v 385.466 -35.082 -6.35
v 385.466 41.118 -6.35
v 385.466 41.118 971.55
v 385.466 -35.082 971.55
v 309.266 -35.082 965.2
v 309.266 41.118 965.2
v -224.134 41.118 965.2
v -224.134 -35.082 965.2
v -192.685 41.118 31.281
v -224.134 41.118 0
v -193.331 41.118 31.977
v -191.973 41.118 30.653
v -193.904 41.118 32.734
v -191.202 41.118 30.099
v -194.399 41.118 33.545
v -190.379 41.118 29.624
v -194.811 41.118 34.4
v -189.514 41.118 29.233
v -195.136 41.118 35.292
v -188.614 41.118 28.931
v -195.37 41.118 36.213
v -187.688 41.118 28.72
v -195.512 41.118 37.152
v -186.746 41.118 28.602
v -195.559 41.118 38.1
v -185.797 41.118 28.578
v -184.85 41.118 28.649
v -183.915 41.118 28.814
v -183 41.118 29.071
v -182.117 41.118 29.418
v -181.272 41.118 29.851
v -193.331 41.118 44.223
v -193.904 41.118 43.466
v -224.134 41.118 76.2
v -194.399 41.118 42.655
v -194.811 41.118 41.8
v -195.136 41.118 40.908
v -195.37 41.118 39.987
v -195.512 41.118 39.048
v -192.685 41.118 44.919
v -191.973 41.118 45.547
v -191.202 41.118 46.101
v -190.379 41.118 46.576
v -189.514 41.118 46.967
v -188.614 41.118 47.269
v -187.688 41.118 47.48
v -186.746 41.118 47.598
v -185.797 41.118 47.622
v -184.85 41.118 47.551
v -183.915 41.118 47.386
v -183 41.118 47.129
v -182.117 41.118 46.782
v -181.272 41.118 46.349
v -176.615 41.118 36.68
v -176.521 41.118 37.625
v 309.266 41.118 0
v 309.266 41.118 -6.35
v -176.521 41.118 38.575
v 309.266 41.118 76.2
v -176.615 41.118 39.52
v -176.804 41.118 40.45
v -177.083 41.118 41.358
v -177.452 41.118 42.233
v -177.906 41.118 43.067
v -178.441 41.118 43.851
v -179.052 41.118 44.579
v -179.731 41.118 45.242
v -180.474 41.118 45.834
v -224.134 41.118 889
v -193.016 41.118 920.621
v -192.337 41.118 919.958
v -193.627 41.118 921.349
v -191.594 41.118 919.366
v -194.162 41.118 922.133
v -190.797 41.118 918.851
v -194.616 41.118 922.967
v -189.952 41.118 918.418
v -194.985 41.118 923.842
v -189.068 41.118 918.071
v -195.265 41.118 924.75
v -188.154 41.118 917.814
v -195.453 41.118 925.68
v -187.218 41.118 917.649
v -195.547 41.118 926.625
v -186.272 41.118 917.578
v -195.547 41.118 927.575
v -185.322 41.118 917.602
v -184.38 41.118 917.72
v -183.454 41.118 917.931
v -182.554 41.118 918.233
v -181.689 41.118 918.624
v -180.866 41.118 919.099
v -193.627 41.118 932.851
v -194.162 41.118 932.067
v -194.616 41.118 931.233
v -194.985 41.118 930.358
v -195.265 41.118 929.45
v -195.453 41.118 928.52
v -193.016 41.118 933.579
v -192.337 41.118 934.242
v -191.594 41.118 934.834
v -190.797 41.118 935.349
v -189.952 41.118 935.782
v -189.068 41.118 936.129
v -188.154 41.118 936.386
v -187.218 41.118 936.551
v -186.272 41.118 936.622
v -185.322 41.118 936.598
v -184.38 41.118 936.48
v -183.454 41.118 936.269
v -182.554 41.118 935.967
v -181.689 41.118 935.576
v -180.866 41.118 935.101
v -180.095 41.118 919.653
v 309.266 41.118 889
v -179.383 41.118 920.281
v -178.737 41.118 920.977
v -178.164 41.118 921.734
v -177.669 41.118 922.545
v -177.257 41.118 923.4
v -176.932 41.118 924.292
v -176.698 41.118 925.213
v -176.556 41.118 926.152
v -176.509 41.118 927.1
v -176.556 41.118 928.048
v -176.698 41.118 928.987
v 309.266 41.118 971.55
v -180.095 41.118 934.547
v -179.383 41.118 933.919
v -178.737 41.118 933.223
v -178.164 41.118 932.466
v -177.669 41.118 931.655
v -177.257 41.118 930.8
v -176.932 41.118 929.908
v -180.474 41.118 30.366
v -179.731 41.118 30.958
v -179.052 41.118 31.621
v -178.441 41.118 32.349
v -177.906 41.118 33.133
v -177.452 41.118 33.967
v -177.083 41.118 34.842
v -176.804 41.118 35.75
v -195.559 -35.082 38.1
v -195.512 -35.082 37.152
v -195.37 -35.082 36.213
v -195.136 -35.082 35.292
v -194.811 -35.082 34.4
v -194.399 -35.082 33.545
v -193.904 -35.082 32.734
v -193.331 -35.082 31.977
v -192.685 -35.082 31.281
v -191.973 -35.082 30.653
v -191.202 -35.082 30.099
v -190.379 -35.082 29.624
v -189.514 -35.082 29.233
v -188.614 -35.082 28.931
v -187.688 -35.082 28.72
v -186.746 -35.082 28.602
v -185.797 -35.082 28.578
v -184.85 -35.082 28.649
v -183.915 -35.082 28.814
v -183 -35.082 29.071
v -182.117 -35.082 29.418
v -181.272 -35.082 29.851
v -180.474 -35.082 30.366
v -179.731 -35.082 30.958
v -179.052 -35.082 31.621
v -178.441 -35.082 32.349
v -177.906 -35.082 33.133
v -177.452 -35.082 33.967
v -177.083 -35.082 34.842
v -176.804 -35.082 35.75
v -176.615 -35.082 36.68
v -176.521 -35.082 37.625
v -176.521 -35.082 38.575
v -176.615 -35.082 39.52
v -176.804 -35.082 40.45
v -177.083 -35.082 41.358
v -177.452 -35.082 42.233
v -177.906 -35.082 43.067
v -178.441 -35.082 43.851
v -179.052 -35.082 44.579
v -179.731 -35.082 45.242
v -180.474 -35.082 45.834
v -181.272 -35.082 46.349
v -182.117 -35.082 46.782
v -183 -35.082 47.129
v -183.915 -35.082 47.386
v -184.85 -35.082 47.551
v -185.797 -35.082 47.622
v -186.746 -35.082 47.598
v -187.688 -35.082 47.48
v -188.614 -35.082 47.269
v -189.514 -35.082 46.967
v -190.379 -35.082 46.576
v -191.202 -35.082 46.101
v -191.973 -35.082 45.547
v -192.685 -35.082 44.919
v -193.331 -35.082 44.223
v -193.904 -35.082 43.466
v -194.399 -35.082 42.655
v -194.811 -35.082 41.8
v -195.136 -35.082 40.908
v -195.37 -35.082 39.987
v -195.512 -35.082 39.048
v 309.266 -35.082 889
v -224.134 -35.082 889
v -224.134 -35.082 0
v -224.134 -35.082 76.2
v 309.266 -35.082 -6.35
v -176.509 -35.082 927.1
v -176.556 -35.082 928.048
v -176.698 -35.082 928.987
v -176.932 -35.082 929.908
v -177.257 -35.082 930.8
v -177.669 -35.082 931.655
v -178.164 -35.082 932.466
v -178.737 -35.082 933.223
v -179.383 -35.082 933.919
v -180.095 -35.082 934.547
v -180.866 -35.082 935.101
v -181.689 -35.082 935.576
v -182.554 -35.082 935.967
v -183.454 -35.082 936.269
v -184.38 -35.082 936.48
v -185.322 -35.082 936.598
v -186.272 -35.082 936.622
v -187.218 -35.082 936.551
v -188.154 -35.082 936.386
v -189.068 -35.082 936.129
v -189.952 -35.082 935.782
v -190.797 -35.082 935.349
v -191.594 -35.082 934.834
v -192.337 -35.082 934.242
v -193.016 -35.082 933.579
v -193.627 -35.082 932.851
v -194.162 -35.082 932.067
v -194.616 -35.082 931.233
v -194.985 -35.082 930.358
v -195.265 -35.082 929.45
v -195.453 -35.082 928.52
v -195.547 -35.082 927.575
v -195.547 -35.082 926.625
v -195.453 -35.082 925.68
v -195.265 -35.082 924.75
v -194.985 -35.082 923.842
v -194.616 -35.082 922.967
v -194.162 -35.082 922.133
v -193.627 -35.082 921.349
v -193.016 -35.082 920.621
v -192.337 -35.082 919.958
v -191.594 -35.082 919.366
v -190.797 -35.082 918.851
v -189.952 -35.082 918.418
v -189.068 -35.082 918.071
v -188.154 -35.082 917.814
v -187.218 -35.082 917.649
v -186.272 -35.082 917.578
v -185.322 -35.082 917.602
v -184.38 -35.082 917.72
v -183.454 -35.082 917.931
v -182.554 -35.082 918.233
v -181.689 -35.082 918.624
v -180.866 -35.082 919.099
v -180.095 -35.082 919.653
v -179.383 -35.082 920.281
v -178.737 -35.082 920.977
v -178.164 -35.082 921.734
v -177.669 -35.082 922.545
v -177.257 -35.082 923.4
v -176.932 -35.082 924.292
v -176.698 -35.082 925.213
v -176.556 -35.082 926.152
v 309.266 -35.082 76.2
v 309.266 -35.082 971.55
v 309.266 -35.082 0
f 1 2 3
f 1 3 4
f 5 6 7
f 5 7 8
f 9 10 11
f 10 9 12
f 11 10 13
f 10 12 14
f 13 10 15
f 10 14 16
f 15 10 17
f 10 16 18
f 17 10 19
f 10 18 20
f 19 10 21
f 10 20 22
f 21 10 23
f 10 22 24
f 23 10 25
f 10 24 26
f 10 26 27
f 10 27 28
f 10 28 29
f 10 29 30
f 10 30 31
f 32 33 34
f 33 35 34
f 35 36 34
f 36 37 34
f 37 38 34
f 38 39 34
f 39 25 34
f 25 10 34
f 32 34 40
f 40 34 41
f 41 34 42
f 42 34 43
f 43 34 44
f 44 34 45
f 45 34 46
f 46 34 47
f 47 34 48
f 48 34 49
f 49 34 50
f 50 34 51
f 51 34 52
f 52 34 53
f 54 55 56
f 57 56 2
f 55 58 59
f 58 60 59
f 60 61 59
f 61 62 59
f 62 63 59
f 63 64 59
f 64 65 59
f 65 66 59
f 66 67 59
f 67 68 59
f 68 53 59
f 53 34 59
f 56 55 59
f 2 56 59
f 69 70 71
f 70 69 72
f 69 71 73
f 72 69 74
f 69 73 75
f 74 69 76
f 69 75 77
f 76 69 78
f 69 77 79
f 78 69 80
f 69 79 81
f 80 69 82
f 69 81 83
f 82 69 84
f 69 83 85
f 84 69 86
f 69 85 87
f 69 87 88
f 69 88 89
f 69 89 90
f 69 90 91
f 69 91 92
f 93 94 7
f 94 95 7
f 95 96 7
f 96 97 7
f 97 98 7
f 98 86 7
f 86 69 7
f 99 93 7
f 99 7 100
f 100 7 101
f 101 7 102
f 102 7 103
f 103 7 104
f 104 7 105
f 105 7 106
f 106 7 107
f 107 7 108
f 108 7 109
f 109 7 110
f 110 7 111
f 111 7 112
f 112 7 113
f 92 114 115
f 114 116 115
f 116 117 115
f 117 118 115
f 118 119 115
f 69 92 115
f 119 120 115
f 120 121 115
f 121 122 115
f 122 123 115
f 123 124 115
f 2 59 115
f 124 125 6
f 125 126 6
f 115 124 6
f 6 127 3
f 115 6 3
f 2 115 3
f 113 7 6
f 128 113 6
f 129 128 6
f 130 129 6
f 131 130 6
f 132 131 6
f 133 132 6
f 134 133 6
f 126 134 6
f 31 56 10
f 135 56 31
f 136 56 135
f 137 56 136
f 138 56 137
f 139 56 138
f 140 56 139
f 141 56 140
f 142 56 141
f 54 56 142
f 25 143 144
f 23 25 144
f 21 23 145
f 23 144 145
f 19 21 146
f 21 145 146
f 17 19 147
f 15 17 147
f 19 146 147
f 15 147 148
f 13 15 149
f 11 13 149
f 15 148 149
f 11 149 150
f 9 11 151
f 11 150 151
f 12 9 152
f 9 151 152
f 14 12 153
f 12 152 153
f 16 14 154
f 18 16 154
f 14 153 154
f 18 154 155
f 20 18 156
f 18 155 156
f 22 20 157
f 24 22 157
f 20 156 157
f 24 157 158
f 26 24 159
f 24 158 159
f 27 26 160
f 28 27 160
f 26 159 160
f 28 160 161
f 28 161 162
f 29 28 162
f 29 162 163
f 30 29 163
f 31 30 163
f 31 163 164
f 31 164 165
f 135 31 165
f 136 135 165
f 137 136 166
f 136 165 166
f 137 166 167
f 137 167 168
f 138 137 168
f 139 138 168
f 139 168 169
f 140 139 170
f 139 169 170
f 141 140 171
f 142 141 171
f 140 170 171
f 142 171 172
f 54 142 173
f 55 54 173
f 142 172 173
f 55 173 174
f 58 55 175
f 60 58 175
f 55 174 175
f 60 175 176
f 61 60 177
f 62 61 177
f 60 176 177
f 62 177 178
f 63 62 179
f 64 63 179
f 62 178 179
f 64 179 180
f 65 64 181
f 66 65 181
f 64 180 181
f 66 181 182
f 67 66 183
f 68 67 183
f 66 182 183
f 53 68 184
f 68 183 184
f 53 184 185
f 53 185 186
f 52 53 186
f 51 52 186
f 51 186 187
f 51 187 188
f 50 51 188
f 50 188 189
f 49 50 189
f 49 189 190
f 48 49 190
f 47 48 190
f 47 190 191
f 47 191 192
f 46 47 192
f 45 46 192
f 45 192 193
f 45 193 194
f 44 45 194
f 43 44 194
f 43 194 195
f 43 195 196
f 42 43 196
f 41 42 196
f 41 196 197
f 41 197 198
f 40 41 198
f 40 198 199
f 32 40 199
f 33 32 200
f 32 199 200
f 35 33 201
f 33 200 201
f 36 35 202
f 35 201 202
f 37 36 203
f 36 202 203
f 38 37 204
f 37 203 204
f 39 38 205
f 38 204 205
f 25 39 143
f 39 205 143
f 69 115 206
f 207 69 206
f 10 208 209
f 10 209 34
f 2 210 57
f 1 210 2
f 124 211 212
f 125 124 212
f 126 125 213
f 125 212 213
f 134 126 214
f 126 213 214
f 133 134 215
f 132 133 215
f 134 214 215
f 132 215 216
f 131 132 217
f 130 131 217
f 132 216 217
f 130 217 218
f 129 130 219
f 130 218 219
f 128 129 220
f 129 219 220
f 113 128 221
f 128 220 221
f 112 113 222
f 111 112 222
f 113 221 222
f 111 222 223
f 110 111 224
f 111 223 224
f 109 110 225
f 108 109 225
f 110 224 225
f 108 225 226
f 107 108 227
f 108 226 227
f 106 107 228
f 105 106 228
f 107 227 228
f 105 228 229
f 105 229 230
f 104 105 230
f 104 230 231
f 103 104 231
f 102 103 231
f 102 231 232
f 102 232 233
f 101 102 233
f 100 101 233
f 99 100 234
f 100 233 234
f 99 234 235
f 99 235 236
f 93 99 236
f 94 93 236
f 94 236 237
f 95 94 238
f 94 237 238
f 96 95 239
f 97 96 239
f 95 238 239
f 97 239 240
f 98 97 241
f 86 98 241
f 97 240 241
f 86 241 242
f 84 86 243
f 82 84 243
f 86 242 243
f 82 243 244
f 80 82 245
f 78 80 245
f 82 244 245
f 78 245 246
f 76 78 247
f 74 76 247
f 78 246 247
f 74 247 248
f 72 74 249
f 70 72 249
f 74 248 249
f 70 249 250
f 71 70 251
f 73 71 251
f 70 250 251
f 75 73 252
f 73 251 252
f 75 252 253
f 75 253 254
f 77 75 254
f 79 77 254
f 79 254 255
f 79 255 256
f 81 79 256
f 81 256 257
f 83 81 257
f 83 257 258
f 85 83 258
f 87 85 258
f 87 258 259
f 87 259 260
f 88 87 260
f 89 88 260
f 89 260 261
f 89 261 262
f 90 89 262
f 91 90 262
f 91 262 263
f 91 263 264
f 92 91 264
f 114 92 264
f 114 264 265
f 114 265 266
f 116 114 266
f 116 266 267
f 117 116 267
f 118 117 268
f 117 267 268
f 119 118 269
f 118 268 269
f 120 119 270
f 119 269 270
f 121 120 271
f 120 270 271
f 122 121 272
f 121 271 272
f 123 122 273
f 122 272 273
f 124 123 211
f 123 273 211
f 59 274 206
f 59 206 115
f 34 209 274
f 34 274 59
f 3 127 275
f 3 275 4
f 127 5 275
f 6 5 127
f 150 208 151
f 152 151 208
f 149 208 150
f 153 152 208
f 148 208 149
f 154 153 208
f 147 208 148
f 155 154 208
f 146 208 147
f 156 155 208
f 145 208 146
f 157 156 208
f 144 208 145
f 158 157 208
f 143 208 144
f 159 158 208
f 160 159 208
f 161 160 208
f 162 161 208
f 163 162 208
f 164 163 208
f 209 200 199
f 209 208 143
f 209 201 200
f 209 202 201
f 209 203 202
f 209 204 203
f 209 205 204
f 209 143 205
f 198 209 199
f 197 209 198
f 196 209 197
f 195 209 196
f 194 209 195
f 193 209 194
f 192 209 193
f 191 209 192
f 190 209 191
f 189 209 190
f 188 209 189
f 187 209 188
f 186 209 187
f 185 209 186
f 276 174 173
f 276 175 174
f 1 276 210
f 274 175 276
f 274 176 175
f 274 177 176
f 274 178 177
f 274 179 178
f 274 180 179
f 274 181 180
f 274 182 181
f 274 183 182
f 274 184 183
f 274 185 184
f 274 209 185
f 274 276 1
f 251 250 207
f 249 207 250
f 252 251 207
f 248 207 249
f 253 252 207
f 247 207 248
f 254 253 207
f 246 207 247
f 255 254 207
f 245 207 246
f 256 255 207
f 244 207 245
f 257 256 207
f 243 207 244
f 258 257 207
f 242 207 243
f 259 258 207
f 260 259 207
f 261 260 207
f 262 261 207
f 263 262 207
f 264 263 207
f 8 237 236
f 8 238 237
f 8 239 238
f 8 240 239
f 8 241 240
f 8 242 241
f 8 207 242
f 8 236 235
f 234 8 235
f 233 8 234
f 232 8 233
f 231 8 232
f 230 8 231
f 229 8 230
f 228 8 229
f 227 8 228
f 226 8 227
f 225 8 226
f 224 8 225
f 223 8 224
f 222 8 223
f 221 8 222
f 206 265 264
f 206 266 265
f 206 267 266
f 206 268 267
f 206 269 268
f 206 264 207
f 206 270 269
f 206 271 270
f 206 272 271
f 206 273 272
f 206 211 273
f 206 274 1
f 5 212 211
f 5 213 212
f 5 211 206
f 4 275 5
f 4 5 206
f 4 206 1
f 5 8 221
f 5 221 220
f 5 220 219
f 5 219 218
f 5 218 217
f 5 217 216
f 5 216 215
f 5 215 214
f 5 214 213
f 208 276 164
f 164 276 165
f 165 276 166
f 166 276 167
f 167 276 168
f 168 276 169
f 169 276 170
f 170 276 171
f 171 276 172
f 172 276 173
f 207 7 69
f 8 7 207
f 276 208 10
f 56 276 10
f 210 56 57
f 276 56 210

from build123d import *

# Parameters (mm, degrees)
F0_W      = 457.2
F0_H      = 76.2
F1_DEPTH  = 76.2
F2_DEPTH  = 152.4
F3_W      = 76.2
F3_H      = 76.2
F4_DEPTH  = 895.35
F5_W      = 76.2
F5_H      = 76.2
F12_DEPTH = 6.35
F6_W      = 76.2
F6_H      = 76.2
F7_DEPTH  = 533.4
F9_DEPTH  = 76.2
F11_DEPTH = 76.2


with BuildPart() as f1:
    # F0 (on Top) → F1 (new body)
    with BuildSketch(Plane.XY):
        with Locations((4.4659457539, 3.0175000429)):
            Rectangle(F0_W, F0_H)
    extrude(amount=F1_DEPTH)

    # F2 (add): a face of the model
    f2_faces = [f1.faces().sort_by_distance(p)[0] for p in [
        (233.0659457539, 3.0175000429, 38.1),
    ]]
    extrude(f2_faces, amount=F2_DEPTH)

    # F3 (on face) → F4 (join)
    with BuildSketch(Plane.XY.offset(76.2)):
        with Locations((347.3659457539, 3.0175000429)):
            Rectangle(F3_W, F3_H)
    extrude(amount=F4_DEPTH)

    # F5 (on face) → F12 (join)
    with BuildSketch(Plane(origin=(0, 0, 0), x_dir=(1, 0, 0), z_dir=(0, 0, -1))):
        with Locations((347.3659457539, -3.0175000429)):
            Rectangle(F5_W, F5_H)
    extrude(amount=F12_DEPTH)

    # F6 (on face) → F7 (join)
    with BuildSketch(Plane(origin=(309.2659457539, 0, 0), x_dir=(0, -1, 0), z_dir=(-1, 0, 0))):
        with Locations((-3.0175000429, 927.1)):
            Rectangle(F6_W, F6_H)
    extrude(amount=F7_DEPTH)

    # F8 (on face) → F9 (cut)
    with BuildSketch(Plane.XZ.offset(35.0824999571)):
        with BuildLine():
            ThreePointArc((-195.5590542461, 927.1), (-186.0340542461, 917.575), (-176.5090542461, 927.1))
            ThreePointArc((-176.5090542461, 927.1), (-186.0340542461, 936.625), (-195.5590542461, 927.1))
        make_face()
    extrude(amount=-F9_DEPTH, mode=Mode.SUBTRACT)

    # F10 (on face) → F11 (cut)
    with BuildSketch(Plane.XZ.offset(35.0824999571)):
        with BuildLine():
            ThreePointArc((-176.5090542461, 38.1), (-186.0340542461, 47.625), (-195.5590542461, 38.1))
            ThreePointArc((-195.5590542461, 38.1), (-186.0340542461, 28.575), (-176.5090542461, 38.1))
        make_face()
    extrude(amount=-F11_DEPTH, mode=Mode.SUBTRACT)


solid = f1.part
